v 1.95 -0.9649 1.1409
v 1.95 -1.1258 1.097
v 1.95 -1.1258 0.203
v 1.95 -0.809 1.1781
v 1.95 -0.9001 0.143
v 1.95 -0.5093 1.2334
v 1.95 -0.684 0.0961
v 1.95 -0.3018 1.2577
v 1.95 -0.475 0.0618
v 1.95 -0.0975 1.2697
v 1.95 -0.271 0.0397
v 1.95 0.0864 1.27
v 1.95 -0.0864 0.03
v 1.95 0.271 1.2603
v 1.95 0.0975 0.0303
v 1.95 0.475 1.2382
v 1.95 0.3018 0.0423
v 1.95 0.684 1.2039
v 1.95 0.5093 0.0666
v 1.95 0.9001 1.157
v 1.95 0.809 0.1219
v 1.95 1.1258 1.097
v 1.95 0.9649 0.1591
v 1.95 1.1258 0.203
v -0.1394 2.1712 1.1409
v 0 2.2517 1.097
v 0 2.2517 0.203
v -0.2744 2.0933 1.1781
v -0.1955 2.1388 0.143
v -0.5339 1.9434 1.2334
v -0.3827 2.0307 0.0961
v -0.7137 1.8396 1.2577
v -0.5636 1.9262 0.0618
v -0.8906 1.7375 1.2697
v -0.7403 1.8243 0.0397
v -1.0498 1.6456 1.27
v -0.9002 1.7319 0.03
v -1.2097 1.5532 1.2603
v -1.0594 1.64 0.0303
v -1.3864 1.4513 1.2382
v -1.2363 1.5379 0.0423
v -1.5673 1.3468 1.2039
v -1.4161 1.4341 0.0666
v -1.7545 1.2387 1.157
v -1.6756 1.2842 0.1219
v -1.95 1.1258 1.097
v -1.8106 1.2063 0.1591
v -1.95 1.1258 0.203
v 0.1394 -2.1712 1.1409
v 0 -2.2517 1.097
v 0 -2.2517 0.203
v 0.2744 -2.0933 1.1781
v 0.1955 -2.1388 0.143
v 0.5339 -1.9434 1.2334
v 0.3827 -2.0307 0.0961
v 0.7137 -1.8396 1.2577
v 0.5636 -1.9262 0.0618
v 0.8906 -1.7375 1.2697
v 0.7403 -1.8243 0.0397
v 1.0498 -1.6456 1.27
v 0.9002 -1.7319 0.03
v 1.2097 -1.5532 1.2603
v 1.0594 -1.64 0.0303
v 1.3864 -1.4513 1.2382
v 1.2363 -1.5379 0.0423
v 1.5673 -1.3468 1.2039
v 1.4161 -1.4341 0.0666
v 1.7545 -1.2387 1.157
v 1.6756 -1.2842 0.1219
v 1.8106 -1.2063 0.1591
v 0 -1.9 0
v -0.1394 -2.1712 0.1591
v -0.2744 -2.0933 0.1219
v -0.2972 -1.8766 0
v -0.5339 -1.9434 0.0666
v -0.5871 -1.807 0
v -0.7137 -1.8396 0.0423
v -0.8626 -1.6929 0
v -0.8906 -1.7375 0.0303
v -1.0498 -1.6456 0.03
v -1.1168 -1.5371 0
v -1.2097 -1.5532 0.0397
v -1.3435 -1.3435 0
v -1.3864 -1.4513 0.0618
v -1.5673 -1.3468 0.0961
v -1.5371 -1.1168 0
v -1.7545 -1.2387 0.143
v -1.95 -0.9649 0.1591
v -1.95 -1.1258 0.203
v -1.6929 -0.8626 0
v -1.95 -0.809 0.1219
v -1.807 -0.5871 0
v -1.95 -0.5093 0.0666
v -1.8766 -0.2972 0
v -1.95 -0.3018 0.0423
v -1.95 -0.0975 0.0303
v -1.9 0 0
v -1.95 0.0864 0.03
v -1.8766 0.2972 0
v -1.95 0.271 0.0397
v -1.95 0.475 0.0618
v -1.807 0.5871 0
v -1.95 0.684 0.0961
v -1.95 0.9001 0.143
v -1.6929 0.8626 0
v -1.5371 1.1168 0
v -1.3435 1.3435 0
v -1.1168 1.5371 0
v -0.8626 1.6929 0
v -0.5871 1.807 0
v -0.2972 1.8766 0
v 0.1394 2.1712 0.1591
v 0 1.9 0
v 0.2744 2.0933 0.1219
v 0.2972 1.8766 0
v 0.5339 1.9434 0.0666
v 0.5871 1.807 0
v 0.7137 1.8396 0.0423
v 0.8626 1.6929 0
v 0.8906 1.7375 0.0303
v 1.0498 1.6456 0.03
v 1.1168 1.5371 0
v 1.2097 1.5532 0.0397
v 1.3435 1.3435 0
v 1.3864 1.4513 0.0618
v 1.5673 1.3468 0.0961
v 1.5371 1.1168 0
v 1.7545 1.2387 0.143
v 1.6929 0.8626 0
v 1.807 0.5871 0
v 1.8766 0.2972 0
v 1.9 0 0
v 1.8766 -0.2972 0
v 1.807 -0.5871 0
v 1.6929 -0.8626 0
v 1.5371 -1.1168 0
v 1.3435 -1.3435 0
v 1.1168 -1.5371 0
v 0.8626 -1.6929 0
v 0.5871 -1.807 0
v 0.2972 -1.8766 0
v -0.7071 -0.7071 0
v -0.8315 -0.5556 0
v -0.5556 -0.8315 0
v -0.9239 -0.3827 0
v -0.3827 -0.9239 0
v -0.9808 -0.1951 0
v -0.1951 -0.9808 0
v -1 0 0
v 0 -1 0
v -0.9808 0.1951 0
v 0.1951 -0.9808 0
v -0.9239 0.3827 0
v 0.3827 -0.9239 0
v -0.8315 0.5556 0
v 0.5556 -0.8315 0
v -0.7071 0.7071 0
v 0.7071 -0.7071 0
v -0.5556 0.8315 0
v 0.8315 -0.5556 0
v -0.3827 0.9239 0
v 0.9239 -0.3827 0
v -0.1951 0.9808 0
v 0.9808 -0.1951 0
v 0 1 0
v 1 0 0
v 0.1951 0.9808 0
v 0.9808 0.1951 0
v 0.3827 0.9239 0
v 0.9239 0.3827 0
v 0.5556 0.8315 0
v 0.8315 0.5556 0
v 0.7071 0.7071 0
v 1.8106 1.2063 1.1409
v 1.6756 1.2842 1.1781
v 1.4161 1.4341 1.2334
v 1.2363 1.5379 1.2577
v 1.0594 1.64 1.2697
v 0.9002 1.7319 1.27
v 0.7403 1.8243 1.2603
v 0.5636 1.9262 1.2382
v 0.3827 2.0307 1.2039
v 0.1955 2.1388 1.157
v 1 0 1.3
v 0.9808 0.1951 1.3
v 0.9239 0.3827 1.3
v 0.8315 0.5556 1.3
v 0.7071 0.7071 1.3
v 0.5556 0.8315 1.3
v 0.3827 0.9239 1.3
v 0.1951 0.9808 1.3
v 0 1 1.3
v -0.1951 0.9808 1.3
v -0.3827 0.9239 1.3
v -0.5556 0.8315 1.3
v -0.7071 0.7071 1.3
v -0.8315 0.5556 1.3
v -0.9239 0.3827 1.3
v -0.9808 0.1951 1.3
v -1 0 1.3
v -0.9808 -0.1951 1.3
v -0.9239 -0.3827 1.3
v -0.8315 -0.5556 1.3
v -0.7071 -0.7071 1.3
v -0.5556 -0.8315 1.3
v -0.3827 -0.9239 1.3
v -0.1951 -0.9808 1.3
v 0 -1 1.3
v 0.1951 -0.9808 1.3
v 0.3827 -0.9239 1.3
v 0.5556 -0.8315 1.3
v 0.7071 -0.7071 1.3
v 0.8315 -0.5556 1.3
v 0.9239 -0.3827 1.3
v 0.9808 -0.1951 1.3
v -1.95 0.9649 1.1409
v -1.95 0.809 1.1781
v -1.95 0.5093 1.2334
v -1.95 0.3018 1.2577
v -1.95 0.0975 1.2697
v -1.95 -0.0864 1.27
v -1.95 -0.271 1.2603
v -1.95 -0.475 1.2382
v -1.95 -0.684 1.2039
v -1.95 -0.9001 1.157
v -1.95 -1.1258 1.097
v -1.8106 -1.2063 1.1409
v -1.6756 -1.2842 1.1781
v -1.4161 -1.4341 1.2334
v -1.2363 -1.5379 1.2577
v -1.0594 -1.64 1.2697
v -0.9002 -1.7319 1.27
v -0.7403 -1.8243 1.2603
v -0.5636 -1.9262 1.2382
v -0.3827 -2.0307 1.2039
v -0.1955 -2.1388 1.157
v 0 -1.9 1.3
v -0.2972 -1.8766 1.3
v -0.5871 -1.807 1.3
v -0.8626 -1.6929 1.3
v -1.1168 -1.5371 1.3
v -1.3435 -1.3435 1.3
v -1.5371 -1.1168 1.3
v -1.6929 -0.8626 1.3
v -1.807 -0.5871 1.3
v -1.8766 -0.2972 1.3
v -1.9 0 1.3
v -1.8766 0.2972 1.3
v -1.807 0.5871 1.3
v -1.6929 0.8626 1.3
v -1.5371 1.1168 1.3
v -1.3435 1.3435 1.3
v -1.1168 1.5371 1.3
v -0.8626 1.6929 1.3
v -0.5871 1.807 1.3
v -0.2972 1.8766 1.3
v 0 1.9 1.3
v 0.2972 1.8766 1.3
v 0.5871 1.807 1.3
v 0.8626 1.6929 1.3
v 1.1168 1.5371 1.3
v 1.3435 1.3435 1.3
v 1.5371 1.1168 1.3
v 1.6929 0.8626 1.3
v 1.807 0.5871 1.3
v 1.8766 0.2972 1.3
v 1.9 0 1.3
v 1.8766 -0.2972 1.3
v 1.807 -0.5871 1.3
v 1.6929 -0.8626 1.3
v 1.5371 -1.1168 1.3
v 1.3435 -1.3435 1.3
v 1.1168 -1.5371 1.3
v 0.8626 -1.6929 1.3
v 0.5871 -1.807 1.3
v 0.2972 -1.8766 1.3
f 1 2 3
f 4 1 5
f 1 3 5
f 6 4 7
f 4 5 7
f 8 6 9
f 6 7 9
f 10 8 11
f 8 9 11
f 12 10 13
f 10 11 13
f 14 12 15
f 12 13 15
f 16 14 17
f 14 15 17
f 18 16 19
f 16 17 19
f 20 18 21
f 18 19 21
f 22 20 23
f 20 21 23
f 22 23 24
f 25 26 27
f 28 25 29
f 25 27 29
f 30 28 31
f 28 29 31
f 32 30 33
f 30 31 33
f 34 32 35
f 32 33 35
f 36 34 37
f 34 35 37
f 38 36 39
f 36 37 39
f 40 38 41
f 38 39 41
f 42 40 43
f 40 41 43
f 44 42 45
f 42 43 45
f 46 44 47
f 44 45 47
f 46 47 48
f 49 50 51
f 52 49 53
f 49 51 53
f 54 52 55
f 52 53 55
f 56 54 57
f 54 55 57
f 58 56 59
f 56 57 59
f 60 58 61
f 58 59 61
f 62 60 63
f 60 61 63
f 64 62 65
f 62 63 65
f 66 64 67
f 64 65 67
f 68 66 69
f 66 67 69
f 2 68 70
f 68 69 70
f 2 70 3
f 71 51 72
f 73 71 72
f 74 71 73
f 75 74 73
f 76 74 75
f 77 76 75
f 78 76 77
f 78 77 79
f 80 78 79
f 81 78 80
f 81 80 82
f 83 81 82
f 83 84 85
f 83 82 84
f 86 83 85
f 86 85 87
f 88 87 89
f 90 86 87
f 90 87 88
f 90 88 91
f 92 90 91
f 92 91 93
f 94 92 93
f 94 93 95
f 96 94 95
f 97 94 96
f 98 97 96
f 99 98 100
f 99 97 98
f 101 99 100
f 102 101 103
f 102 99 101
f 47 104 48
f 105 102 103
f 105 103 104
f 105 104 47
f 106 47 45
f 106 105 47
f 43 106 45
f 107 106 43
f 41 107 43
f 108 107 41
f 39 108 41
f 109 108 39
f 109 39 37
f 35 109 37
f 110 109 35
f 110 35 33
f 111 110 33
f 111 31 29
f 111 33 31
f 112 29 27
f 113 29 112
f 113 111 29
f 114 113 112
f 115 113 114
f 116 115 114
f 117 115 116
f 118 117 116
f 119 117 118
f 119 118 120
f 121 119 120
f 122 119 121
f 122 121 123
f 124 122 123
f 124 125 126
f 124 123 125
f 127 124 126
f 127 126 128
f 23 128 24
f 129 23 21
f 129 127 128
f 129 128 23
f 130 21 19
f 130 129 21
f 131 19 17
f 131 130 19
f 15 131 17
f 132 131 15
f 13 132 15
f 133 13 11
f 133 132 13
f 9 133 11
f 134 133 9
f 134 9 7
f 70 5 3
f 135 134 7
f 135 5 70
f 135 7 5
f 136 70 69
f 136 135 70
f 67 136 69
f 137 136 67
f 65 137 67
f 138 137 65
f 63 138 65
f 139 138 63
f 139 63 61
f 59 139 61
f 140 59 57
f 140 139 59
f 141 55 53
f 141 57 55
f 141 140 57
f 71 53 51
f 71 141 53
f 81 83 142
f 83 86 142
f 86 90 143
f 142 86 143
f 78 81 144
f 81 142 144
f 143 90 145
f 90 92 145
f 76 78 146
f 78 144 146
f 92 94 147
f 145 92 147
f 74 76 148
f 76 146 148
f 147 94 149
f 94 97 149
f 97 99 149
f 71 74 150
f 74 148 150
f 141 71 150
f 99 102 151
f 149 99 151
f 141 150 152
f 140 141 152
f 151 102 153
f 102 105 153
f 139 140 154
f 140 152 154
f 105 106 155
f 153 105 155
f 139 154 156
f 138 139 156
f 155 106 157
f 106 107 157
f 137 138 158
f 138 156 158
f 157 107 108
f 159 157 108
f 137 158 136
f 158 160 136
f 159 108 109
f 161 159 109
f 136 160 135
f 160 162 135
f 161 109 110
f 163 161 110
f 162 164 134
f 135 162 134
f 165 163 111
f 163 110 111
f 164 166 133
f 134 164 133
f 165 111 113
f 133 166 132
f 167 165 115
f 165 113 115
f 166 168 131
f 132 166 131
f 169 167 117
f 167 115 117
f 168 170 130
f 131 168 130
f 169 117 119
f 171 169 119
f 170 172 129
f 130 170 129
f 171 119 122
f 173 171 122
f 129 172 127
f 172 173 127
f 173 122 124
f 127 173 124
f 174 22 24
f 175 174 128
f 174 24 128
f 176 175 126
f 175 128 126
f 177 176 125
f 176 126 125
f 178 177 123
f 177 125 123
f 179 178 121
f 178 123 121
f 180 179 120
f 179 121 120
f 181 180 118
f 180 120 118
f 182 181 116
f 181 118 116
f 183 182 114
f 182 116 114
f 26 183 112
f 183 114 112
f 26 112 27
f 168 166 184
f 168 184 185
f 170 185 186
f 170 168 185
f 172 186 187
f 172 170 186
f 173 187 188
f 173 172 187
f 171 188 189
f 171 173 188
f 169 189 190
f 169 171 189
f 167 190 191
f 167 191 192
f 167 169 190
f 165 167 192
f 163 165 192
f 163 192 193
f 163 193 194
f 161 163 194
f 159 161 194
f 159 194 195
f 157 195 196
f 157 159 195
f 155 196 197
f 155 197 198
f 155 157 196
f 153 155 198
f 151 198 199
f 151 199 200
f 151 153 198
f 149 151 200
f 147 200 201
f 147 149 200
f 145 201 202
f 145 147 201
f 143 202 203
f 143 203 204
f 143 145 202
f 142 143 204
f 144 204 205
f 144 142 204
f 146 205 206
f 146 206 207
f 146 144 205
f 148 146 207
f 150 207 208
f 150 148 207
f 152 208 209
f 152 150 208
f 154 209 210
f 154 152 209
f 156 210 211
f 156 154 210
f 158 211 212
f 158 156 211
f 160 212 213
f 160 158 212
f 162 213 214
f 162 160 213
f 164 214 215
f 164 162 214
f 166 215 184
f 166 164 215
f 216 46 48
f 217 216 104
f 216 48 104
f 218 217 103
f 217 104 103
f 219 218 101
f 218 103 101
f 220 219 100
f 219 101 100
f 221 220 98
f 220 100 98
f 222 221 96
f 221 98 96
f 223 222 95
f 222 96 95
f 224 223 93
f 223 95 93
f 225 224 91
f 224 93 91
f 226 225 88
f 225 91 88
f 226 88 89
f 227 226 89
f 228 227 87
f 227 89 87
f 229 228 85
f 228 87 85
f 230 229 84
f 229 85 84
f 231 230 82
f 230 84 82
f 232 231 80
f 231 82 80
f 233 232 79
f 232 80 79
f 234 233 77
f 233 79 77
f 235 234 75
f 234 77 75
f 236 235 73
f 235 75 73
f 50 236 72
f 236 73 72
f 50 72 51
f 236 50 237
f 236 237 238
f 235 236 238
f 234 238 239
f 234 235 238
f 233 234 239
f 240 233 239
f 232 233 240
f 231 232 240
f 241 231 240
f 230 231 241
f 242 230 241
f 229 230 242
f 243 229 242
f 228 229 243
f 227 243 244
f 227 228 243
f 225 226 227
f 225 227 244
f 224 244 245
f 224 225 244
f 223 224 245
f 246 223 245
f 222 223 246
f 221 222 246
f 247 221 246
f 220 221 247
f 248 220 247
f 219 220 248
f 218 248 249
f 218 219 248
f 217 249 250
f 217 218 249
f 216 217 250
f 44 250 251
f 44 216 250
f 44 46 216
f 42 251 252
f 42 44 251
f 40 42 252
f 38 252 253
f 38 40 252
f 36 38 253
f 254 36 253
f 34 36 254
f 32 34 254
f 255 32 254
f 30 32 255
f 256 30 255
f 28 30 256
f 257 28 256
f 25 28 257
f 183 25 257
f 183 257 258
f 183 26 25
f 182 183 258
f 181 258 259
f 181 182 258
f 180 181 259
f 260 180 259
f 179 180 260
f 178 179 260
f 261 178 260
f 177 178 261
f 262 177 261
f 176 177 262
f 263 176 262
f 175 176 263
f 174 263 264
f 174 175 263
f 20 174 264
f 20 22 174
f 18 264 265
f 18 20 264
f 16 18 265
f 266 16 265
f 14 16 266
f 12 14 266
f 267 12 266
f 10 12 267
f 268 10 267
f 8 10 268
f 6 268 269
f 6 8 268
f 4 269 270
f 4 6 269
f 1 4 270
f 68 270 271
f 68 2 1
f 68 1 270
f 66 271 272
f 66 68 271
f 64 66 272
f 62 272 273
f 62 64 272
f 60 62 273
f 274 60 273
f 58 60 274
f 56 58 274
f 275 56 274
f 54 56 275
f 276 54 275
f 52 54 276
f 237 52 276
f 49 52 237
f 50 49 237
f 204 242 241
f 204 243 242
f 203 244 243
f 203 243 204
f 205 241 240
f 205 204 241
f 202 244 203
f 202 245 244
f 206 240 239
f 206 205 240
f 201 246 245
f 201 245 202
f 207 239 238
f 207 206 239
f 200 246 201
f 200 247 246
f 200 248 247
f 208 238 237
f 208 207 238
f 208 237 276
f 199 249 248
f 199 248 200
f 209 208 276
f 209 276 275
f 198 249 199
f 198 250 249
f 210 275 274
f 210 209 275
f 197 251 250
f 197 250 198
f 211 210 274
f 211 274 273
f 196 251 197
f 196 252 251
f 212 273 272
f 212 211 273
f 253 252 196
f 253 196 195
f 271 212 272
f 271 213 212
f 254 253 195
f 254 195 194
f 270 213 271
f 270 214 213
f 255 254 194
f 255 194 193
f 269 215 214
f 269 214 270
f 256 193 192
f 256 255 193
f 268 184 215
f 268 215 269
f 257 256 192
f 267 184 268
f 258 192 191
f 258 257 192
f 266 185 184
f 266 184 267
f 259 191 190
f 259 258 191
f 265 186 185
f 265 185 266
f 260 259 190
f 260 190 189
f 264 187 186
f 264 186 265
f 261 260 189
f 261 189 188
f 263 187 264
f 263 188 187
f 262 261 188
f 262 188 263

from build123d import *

# Parameters (mm, degrees)
SKETCH1_R      = 1
EXTRUDE1_DEPTH = 1.3


with BuildPart() as part:
    # Sketch1 → Extrude1 (new body)
    with BuildSketch(Plane.XY):
        Polygon((0, 2.25166605), (-1.95, 1.125833025), (-1.95, -1.125833025), (0, -2.25166605), (1.95, -1.125833025), (1.95, 1.125833025), align=None)
        Circle(SKETCH1_R, mode=Mode.SUBTRACT)
    extrude(amount=EXTRUDE1_DEPTH)

    # Sketch2 → Cut-Revolve1 (revolve, cut)
    with BuildSketch(Plane(origin=(0, 0, 0), x_dir=(0, 0, -1), z_dir=(1, 0, 0)), mode=Mode.PRIVATE) as cut_revolve1_sk:
        Polygon((-1.3, 1.9), (-0.865098791, 2.65327099), (-1.3, 2.65327099), align=None)
        Polygon((-0.434901209, 2.65327099), (0, 1.9), (0, 2.65327099), align=None)
    revolve(cut_revolve1_sk.sketch.rotate(Axis((0, 0, 1.3), (0, 0, -1)), 180), axis=Axis((0, 0, 1.3), (0, 0, -1)), mode=Mode.SUBTRACT)


solid = part.part
